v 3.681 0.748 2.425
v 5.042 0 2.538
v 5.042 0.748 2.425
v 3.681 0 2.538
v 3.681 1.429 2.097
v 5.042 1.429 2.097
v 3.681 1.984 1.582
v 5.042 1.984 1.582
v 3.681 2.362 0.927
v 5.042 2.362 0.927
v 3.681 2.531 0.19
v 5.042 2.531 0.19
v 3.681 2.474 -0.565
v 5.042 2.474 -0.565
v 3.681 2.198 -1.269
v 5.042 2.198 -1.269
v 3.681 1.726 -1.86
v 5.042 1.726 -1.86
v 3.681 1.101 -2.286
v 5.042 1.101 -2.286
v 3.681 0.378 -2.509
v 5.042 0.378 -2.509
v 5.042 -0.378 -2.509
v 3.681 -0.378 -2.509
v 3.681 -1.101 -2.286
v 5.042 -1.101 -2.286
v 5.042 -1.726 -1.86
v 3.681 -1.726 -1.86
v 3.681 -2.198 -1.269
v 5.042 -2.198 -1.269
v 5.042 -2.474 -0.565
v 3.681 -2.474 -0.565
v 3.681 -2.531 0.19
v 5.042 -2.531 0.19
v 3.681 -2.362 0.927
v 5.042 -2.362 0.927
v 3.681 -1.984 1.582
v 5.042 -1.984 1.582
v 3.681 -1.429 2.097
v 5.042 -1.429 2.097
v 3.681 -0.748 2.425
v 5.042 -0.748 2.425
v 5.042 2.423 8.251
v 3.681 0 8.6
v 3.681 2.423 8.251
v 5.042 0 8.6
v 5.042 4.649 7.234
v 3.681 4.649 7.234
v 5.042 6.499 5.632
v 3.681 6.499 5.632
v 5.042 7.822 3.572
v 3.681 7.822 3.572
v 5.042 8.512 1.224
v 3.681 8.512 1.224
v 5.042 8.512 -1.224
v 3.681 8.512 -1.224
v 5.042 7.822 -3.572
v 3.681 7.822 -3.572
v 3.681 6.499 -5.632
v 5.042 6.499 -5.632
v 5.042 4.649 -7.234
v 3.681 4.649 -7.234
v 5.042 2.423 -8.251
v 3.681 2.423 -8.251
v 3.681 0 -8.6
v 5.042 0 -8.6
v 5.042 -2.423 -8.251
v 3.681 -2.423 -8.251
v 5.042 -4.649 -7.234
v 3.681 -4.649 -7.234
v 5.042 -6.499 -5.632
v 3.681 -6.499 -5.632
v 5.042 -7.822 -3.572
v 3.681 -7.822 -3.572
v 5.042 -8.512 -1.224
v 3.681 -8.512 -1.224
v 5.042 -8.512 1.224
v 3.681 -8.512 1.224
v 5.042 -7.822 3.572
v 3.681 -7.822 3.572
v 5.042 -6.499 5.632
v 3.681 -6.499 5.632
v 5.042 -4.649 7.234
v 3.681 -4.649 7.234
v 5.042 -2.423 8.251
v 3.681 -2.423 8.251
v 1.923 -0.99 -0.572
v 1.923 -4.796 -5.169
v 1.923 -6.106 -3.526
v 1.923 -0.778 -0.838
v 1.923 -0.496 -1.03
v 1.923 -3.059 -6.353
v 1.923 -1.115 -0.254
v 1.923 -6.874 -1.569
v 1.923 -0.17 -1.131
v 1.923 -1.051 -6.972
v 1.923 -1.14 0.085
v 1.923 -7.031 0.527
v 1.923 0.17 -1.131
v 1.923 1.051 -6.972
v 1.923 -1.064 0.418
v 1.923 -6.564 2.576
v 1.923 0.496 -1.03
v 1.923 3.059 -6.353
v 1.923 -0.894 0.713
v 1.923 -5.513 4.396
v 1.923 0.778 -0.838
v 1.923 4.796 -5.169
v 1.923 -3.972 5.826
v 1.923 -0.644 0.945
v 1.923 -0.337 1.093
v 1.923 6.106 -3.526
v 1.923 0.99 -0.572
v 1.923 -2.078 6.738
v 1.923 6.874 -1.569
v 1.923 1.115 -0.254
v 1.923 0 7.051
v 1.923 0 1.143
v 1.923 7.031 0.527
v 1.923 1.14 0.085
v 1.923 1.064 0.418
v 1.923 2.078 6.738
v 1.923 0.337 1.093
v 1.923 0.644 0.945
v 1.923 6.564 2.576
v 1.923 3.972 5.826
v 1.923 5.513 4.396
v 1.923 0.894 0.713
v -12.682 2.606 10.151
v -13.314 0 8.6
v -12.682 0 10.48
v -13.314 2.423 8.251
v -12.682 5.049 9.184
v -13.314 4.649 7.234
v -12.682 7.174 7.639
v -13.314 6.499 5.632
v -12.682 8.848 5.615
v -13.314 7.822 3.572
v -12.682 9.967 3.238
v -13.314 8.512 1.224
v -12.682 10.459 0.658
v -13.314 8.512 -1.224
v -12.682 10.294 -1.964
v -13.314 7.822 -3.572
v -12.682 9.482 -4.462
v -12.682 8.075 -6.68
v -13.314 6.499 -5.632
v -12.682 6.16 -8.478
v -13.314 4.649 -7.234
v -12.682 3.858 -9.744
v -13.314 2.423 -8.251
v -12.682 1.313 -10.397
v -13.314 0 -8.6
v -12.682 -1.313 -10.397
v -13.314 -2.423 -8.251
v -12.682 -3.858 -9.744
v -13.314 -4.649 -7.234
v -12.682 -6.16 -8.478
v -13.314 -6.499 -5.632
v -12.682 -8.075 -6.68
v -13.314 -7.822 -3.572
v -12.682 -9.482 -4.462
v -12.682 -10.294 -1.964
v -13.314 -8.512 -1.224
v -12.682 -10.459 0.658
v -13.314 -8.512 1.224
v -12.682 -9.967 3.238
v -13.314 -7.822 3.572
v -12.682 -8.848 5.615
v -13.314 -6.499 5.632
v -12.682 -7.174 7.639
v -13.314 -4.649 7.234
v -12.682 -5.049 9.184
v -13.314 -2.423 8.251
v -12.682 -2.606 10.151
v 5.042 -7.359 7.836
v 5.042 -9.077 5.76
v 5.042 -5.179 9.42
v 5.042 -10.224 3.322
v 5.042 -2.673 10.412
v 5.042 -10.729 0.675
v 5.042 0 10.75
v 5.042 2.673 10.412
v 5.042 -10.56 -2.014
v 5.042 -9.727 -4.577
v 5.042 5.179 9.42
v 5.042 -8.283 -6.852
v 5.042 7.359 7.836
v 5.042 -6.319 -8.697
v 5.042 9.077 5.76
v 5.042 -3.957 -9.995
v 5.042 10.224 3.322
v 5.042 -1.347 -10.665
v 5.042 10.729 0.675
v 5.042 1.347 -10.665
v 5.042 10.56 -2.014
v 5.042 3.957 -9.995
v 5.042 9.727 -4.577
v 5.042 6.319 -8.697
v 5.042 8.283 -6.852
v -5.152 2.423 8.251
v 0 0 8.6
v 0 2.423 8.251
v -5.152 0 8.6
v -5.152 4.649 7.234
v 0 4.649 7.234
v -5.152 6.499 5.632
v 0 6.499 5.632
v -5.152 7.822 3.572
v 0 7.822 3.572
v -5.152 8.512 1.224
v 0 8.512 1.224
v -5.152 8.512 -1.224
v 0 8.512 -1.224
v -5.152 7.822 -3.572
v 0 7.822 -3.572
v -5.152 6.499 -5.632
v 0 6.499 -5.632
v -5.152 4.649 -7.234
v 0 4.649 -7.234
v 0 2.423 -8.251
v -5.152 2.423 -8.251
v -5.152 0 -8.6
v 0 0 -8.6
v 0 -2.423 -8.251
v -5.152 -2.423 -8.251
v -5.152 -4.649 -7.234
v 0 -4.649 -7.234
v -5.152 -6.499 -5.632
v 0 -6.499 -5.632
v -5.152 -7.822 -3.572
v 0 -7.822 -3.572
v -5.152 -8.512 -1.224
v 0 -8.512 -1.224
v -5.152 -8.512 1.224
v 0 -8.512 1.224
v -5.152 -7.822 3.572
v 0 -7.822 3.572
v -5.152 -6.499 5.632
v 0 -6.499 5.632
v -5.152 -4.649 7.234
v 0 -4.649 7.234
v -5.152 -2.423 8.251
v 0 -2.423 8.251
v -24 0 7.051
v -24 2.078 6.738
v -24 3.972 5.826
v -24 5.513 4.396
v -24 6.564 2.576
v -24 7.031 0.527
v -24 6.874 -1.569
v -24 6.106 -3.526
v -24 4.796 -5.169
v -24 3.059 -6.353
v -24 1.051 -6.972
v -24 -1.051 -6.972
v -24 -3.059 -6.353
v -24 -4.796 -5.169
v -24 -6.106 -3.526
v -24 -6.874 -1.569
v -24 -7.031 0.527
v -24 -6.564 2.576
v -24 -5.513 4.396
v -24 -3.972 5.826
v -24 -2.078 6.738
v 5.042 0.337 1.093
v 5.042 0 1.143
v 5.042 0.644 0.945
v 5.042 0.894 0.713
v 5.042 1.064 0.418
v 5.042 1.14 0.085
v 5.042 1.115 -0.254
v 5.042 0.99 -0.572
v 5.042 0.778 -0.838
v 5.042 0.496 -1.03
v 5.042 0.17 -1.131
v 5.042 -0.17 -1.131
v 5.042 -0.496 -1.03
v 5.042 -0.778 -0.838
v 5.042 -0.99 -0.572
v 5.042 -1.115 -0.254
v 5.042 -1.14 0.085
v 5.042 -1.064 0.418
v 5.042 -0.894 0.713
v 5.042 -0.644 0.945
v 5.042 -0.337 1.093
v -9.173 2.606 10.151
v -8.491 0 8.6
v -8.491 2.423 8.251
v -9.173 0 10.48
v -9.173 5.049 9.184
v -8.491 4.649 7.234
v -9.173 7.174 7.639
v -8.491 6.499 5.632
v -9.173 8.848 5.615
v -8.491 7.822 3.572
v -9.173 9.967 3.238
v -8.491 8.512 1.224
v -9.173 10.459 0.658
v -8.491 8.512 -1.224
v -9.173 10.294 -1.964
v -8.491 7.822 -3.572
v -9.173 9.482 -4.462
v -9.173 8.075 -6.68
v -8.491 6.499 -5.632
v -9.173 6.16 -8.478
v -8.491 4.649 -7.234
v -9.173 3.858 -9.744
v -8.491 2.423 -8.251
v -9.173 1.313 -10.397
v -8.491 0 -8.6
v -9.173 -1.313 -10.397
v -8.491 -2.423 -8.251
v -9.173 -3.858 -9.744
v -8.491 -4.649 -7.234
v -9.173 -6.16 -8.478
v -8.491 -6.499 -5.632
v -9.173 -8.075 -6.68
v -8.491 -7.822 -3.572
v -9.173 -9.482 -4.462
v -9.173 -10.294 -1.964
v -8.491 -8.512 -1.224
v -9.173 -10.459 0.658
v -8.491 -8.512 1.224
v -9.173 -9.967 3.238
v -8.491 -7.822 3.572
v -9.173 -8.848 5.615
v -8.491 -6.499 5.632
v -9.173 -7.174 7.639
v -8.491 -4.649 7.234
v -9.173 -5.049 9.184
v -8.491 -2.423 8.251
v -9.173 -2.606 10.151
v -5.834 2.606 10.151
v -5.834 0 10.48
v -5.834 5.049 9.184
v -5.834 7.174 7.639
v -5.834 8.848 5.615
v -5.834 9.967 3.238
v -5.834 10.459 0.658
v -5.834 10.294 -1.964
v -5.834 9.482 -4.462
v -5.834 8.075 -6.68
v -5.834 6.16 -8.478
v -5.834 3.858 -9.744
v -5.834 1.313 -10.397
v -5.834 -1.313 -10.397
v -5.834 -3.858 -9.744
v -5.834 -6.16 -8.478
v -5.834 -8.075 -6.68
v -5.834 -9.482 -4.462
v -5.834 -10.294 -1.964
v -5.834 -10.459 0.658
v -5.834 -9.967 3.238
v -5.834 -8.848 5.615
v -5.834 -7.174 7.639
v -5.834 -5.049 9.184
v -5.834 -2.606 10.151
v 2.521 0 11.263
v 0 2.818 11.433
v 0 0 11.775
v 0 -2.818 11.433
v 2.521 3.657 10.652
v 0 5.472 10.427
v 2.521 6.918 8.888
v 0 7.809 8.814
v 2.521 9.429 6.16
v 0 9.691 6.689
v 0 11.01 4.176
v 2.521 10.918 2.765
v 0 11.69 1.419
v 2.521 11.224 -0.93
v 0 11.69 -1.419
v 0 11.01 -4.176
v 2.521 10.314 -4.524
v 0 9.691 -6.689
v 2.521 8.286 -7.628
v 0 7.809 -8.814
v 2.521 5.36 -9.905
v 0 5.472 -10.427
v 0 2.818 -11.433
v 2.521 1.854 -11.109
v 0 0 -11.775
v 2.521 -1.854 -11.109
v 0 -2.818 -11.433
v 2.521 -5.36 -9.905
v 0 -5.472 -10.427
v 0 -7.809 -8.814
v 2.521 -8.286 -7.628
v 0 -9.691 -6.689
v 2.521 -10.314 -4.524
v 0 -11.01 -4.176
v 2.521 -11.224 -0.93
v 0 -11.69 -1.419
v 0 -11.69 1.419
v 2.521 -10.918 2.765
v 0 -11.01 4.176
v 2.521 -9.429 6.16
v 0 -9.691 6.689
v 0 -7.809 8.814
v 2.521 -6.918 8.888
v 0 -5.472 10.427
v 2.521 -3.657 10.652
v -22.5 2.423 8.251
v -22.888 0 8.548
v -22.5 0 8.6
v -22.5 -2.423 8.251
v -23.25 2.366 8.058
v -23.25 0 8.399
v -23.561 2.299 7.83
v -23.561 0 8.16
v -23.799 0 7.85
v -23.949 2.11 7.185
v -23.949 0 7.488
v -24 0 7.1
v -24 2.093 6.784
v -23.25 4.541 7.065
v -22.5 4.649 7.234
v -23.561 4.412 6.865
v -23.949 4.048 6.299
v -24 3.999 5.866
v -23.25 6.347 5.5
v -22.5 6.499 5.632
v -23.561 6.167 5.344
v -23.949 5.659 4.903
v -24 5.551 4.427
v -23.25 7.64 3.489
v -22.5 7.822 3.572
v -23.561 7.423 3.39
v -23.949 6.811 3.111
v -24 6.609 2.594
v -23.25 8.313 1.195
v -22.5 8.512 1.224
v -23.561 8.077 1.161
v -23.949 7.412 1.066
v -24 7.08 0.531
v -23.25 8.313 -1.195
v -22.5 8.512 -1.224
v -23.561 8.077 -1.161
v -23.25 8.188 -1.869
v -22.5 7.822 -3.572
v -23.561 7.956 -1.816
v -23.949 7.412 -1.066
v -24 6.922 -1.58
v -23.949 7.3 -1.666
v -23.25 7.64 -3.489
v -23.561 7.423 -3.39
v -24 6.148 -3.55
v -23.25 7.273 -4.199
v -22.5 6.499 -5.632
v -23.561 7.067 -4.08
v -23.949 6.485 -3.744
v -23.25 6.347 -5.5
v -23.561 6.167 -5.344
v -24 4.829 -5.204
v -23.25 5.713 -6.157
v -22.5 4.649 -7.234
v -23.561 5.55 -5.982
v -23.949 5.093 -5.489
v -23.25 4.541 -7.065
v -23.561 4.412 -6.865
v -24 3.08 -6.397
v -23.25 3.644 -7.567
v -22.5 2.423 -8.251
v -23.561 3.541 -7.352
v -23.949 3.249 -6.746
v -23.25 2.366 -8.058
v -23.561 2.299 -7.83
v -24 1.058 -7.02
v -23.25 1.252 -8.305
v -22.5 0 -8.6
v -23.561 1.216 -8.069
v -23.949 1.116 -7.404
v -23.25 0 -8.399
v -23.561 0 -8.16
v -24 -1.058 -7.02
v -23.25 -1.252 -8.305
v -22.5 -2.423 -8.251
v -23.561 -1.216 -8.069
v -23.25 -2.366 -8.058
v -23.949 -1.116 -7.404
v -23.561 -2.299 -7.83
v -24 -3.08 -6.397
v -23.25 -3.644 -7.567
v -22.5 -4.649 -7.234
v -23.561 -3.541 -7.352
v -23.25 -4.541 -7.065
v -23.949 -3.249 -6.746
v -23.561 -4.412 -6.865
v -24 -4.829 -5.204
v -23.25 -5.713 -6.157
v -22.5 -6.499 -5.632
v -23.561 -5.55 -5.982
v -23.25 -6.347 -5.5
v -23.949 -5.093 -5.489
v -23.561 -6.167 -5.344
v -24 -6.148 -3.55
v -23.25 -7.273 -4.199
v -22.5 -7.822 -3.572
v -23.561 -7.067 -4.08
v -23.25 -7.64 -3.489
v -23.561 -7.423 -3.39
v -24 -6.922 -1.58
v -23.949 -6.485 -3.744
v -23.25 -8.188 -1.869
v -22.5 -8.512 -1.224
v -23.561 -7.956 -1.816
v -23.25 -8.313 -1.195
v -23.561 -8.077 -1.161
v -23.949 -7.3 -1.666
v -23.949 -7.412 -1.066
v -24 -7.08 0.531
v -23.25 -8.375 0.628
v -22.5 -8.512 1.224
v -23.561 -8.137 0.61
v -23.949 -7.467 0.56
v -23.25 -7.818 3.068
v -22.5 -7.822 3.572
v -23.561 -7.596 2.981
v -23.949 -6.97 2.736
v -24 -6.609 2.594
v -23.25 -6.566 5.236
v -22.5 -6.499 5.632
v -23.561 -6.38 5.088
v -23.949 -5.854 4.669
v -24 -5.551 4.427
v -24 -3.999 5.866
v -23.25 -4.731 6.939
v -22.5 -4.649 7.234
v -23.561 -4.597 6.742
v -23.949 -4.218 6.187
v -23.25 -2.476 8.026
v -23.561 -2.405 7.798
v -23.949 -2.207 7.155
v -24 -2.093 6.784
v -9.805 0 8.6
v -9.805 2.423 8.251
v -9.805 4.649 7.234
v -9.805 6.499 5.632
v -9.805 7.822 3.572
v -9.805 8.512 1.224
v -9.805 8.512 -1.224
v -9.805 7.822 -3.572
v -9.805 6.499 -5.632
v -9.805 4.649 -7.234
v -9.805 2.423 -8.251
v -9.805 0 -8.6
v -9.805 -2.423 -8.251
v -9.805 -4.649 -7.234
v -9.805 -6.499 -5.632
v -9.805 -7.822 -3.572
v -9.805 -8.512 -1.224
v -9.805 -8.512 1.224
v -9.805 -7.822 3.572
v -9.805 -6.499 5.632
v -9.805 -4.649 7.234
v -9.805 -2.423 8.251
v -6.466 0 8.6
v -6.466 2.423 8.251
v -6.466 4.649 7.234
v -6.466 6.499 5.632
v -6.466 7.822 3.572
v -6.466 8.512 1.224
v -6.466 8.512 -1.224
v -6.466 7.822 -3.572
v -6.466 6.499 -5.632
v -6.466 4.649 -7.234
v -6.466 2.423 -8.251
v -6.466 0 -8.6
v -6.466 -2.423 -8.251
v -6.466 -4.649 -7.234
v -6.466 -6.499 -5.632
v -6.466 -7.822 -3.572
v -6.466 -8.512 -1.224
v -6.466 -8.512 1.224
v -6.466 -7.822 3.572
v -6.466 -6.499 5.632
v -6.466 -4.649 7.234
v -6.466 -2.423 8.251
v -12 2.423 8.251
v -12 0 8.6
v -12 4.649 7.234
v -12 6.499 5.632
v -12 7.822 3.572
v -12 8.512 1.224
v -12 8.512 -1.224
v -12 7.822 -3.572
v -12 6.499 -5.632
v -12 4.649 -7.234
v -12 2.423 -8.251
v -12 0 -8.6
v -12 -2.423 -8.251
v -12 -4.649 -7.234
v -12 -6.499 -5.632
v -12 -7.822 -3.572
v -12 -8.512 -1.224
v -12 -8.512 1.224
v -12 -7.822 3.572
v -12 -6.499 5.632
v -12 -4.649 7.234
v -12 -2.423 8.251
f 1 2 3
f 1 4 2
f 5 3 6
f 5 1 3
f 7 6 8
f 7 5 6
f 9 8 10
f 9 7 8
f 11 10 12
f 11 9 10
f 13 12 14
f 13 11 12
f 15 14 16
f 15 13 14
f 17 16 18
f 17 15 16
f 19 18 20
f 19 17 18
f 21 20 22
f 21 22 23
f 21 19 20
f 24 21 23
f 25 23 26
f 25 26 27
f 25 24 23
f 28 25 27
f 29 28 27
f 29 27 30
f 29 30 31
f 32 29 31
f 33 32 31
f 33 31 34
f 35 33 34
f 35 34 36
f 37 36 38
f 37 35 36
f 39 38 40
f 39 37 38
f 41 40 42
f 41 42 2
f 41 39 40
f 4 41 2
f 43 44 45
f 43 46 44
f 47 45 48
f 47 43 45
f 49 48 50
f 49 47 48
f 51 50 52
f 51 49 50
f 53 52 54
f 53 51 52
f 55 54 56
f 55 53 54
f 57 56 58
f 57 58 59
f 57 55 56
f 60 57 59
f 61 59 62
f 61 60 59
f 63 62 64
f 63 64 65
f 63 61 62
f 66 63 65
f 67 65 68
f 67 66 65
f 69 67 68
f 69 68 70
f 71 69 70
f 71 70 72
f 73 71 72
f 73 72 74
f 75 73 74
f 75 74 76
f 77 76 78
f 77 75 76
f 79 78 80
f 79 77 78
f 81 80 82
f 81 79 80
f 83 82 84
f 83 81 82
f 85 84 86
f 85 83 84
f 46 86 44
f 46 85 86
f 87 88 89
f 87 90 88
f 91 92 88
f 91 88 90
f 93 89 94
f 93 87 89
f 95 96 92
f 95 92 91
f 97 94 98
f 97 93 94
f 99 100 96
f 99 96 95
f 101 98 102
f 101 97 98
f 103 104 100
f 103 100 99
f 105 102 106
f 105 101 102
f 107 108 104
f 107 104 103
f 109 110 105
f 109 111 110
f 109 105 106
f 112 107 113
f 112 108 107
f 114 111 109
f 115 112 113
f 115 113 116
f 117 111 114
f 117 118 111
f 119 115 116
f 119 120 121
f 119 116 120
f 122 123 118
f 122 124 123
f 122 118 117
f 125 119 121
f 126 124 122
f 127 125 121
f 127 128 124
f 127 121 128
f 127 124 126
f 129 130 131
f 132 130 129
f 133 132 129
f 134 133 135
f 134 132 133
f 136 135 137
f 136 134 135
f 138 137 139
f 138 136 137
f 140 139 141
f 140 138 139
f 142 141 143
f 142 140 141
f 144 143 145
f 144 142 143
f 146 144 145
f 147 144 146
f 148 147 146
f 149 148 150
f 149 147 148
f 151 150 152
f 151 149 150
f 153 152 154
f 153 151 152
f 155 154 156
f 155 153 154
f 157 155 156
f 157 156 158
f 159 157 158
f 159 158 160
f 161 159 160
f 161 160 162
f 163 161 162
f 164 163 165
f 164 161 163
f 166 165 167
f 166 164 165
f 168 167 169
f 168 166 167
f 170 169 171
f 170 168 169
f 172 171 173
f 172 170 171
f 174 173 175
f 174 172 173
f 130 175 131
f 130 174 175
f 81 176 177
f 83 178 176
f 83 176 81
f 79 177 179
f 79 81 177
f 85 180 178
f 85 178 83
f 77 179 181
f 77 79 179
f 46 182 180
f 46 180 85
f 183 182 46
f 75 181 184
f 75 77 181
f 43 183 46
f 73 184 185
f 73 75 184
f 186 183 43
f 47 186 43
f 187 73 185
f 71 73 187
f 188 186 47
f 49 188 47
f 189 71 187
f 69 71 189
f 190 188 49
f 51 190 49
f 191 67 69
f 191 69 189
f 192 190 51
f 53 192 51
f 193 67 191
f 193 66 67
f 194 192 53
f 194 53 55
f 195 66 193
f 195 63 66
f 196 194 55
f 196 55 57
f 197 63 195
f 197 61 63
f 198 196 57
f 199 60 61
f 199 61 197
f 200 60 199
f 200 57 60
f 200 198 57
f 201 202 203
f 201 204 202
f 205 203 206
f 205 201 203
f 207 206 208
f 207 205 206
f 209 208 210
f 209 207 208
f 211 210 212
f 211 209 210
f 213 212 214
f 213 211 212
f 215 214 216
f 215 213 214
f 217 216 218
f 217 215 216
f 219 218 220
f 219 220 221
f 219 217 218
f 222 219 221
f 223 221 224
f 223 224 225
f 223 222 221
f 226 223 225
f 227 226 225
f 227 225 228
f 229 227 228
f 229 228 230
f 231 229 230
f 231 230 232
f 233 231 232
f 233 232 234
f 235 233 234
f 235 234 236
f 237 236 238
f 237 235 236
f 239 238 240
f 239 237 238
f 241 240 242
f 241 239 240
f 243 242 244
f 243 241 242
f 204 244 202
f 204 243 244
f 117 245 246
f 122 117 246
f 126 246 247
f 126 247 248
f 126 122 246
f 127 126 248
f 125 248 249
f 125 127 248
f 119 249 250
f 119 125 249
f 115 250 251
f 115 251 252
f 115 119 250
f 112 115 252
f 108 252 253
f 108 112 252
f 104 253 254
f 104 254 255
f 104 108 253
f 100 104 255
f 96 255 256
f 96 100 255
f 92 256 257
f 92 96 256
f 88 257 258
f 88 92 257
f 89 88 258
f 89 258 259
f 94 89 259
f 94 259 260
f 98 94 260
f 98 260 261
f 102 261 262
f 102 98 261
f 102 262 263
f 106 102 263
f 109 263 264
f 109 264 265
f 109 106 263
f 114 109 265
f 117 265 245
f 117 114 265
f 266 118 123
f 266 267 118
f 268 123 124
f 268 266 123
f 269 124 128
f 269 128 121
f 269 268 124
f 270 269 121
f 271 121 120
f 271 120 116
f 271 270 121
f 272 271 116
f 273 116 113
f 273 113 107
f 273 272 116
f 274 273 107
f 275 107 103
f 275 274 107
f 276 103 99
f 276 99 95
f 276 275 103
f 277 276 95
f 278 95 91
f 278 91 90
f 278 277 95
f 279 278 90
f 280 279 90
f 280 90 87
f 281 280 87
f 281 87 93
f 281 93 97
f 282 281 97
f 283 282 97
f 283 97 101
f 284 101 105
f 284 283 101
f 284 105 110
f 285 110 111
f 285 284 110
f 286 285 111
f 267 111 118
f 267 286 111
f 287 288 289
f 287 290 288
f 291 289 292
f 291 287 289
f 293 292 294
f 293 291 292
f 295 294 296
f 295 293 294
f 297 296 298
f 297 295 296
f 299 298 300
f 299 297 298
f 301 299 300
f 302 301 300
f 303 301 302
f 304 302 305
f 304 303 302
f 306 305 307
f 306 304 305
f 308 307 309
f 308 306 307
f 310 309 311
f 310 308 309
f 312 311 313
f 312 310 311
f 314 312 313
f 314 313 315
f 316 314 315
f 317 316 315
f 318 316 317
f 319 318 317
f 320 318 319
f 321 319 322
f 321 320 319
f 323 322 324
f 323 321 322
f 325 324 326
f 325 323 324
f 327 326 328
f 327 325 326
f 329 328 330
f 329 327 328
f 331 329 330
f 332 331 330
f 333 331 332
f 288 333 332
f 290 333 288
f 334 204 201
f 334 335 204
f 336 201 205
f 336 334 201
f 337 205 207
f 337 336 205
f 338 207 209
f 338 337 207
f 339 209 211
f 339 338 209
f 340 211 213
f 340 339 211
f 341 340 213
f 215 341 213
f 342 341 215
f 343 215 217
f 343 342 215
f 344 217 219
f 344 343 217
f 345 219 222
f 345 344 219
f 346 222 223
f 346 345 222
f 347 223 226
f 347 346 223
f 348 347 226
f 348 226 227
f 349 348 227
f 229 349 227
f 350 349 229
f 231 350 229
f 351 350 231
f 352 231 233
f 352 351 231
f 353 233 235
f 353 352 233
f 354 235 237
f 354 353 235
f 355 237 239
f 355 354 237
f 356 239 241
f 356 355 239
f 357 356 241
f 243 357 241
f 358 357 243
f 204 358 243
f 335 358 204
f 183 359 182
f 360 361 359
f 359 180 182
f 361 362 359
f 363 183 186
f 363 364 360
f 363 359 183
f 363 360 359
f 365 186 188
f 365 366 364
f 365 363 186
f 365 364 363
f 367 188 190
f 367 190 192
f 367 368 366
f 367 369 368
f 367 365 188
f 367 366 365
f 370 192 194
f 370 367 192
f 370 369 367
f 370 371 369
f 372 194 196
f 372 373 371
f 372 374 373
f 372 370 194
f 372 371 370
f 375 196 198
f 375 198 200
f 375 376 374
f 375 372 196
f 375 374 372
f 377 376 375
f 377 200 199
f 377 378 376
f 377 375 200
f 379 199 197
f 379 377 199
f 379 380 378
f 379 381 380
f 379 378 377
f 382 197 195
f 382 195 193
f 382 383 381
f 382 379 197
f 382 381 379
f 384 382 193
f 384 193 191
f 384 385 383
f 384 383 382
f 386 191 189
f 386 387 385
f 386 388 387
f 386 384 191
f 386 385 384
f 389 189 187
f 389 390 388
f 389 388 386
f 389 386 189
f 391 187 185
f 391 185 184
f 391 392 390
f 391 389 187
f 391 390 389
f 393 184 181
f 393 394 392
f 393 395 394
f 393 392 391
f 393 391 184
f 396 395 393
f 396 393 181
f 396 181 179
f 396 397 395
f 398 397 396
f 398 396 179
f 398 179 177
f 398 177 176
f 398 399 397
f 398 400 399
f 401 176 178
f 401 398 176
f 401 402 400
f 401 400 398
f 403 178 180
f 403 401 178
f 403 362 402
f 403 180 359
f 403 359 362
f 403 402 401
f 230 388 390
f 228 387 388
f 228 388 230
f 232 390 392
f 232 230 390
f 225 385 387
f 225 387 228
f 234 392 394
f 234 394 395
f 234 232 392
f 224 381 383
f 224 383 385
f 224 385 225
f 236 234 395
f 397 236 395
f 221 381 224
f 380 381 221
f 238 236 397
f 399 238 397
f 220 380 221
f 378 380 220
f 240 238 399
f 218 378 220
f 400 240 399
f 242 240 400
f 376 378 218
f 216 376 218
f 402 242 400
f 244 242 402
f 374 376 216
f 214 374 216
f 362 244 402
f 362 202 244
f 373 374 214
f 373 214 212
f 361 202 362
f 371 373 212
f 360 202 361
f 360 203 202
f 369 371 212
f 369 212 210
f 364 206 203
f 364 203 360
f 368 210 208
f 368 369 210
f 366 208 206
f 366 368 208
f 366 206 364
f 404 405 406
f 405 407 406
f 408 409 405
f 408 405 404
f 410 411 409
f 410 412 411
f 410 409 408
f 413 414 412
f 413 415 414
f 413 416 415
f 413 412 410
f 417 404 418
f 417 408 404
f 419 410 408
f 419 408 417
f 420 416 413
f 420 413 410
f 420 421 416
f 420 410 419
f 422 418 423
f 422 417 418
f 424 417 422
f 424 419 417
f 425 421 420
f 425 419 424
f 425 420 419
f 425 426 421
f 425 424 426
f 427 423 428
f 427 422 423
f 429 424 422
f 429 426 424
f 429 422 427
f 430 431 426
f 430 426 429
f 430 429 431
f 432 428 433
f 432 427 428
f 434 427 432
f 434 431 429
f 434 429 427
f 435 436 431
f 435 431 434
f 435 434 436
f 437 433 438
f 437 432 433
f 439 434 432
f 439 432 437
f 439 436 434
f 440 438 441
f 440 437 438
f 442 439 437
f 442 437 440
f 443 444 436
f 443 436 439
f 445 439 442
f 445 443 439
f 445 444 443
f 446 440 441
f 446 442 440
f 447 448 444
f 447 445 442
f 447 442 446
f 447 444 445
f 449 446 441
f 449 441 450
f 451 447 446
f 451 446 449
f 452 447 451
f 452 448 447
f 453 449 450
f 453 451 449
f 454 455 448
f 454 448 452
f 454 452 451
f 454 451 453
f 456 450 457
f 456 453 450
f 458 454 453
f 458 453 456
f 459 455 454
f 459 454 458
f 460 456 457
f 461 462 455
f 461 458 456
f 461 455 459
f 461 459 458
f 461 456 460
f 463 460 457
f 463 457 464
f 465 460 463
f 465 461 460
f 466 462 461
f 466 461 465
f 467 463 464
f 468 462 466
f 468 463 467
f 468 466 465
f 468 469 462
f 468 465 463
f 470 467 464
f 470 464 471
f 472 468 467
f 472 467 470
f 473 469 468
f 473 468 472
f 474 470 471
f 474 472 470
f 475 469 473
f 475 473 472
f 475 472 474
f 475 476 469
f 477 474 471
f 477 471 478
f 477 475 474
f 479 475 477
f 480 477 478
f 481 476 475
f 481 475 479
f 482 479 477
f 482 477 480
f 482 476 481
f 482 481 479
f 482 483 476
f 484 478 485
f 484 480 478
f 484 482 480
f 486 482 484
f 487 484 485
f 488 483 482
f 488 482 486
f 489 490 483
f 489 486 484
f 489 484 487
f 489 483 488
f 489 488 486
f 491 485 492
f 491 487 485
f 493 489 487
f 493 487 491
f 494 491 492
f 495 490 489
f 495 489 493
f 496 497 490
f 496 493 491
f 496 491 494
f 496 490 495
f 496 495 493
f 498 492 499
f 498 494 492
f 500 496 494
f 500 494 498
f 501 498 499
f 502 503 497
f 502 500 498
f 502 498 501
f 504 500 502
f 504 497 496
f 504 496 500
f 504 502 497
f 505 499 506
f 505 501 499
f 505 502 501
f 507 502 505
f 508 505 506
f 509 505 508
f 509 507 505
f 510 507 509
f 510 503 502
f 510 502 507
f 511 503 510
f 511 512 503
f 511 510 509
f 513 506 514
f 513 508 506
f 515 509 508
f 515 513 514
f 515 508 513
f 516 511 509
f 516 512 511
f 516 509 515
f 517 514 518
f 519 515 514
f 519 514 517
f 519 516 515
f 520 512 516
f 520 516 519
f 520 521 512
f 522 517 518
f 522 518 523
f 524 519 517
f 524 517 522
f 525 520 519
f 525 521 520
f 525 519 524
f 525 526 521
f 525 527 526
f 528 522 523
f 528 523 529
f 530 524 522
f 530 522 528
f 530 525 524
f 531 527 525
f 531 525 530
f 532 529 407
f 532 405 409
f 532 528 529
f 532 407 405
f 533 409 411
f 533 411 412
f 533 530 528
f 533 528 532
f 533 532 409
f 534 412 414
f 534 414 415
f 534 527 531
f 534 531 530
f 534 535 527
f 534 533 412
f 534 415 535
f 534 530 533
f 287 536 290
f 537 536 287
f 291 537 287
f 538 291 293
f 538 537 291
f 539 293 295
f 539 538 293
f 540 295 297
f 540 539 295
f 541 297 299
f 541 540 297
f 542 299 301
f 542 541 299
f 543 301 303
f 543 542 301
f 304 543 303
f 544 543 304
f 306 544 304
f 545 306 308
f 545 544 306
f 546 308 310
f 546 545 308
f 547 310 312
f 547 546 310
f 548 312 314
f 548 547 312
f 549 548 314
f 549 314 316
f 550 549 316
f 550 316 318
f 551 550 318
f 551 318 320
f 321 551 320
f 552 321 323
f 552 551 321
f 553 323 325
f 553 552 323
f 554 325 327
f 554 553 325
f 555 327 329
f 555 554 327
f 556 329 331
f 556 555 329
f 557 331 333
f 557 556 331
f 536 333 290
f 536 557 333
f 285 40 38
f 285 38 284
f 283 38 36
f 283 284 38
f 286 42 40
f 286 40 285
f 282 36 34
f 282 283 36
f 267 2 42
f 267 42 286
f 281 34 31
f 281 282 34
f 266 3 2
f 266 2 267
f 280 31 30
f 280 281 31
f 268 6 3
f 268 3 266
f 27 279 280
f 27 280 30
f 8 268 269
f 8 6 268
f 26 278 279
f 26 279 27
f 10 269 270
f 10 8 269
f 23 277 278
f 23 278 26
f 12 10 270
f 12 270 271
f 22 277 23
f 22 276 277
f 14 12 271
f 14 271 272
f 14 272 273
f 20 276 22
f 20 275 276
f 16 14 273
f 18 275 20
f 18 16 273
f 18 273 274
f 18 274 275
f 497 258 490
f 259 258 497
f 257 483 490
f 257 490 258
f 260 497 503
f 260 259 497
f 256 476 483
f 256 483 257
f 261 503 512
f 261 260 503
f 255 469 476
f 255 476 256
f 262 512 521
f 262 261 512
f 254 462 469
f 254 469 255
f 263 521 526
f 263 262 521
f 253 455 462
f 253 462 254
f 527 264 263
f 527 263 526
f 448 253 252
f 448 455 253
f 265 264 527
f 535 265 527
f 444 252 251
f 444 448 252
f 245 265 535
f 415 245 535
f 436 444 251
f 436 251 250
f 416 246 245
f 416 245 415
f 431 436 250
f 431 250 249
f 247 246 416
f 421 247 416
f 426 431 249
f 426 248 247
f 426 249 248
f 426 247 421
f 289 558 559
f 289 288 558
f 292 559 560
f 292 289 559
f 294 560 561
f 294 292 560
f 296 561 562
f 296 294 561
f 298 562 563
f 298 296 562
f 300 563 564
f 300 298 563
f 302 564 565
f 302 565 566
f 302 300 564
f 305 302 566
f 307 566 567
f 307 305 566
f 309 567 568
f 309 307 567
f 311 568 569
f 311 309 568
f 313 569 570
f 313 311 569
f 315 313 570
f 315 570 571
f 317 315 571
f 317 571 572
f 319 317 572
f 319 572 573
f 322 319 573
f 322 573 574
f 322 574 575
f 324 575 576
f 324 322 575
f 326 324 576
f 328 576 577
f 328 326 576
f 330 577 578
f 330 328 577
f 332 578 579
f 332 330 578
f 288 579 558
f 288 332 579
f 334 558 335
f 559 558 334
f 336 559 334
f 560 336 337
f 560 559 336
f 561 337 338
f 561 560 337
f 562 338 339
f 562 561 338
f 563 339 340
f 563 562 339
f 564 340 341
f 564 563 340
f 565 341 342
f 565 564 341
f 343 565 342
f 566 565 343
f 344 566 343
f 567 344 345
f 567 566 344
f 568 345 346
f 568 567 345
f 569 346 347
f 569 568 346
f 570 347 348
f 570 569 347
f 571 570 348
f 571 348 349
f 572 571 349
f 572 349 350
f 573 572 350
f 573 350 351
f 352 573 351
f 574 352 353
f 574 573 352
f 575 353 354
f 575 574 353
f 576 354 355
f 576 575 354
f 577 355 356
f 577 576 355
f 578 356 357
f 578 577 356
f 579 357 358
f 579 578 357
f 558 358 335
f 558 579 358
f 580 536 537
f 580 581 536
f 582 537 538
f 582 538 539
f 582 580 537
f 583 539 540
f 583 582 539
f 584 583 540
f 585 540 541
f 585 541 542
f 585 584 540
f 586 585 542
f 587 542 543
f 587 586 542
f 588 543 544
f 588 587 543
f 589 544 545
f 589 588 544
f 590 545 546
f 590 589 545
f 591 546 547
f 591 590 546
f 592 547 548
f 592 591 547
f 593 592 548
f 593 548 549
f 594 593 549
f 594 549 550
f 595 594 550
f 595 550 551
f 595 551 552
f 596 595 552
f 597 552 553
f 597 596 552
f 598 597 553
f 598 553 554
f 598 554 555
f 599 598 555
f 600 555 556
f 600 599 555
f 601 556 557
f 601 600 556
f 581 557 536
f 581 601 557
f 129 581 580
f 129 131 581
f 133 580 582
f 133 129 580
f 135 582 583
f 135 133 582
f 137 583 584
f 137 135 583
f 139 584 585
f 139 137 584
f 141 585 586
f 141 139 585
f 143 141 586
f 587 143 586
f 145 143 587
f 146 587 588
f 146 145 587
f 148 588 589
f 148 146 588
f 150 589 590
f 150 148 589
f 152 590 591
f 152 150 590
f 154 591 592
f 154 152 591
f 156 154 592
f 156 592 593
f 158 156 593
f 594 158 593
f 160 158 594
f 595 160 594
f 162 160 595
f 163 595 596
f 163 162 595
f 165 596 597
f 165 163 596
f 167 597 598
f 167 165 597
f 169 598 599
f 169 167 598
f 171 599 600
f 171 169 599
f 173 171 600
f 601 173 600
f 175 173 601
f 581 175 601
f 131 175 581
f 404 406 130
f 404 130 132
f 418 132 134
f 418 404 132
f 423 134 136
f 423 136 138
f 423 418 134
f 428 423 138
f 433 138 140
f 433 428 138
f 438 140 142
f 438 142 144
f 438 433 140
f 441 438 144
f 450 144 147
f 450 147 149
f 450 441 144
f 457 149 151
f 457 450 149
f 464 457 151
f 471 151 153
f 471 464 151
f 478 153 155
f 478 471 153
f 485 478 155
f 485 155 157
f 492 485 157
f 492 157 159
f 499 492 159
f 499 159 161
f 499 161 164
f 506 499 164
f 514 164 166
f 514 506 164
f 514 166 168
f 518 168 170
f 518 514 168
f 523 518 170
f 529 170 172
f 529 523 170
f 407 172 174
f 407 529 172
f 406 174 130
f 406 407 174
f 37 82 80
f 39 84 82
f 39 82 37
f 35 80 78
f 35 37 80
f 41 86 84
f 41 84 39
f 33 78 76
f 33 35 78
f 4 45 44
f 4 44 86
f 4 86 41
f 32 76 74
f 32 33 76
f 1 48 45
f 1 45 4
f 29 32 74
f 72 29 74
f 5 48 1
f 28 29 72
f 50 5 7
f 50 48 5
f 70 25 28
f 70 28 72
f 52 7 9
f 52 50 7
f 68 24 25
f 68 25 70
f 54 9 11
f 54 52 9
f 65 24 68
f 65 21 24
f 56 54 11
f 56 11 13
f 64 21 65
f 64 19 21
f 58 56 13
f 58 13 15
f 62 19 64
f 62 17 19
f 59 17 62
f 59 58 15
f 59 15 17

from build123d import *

# Parameters (mm, degrees)
F2_R = 1.5


with BuildPart() as f1:
    # F0 (on Front) → F1 (revolve)
    with BuildSketch(Plane.XZ):
        Polygon((-9.172741, 10.47979), (-9.804832, 8.599592), (-8.490813, 8.599592), align=None)
        Polygon((-5.833726, 10.47979), (-6.465817, 8.599592), (-5.151798, 8.599592), align=None)
        Polygon((-13.314019, 8.599592), (-24, 8.599592), (-24, 7.051038), (1.923128, 7.051038), (1.923128, 1.143372), (5.041865, 1.143372), (5.041865, 2.537624), (3.681099, 2.537624), (3.681099, 8.599592), (5.041865, 8.599592), (5.041865, 10.75), (0, 11.77545), (0, 8.599592), (-5.151798, 8.599592), (-6.465817, 8.599592), (-8.490813, 8.599592), (-9.804832, 8.599592), (-12, 8.599592), align=None)
        Polygon((-12.681928, 10.47979), (-13.314019, 8.599592), (-12, 8.599592), align=None)
    revolve(axis=Axis((-12, 0, 0), (-1, 0, 0)))

    # F2
    f2_edges = [f1.edges().sort_by_distance(p)[0] for p in [
        (-24, 0, -8.599592),
    ]]
    fillet(f2_edges, radius=F2_R)


solid = f1.part
